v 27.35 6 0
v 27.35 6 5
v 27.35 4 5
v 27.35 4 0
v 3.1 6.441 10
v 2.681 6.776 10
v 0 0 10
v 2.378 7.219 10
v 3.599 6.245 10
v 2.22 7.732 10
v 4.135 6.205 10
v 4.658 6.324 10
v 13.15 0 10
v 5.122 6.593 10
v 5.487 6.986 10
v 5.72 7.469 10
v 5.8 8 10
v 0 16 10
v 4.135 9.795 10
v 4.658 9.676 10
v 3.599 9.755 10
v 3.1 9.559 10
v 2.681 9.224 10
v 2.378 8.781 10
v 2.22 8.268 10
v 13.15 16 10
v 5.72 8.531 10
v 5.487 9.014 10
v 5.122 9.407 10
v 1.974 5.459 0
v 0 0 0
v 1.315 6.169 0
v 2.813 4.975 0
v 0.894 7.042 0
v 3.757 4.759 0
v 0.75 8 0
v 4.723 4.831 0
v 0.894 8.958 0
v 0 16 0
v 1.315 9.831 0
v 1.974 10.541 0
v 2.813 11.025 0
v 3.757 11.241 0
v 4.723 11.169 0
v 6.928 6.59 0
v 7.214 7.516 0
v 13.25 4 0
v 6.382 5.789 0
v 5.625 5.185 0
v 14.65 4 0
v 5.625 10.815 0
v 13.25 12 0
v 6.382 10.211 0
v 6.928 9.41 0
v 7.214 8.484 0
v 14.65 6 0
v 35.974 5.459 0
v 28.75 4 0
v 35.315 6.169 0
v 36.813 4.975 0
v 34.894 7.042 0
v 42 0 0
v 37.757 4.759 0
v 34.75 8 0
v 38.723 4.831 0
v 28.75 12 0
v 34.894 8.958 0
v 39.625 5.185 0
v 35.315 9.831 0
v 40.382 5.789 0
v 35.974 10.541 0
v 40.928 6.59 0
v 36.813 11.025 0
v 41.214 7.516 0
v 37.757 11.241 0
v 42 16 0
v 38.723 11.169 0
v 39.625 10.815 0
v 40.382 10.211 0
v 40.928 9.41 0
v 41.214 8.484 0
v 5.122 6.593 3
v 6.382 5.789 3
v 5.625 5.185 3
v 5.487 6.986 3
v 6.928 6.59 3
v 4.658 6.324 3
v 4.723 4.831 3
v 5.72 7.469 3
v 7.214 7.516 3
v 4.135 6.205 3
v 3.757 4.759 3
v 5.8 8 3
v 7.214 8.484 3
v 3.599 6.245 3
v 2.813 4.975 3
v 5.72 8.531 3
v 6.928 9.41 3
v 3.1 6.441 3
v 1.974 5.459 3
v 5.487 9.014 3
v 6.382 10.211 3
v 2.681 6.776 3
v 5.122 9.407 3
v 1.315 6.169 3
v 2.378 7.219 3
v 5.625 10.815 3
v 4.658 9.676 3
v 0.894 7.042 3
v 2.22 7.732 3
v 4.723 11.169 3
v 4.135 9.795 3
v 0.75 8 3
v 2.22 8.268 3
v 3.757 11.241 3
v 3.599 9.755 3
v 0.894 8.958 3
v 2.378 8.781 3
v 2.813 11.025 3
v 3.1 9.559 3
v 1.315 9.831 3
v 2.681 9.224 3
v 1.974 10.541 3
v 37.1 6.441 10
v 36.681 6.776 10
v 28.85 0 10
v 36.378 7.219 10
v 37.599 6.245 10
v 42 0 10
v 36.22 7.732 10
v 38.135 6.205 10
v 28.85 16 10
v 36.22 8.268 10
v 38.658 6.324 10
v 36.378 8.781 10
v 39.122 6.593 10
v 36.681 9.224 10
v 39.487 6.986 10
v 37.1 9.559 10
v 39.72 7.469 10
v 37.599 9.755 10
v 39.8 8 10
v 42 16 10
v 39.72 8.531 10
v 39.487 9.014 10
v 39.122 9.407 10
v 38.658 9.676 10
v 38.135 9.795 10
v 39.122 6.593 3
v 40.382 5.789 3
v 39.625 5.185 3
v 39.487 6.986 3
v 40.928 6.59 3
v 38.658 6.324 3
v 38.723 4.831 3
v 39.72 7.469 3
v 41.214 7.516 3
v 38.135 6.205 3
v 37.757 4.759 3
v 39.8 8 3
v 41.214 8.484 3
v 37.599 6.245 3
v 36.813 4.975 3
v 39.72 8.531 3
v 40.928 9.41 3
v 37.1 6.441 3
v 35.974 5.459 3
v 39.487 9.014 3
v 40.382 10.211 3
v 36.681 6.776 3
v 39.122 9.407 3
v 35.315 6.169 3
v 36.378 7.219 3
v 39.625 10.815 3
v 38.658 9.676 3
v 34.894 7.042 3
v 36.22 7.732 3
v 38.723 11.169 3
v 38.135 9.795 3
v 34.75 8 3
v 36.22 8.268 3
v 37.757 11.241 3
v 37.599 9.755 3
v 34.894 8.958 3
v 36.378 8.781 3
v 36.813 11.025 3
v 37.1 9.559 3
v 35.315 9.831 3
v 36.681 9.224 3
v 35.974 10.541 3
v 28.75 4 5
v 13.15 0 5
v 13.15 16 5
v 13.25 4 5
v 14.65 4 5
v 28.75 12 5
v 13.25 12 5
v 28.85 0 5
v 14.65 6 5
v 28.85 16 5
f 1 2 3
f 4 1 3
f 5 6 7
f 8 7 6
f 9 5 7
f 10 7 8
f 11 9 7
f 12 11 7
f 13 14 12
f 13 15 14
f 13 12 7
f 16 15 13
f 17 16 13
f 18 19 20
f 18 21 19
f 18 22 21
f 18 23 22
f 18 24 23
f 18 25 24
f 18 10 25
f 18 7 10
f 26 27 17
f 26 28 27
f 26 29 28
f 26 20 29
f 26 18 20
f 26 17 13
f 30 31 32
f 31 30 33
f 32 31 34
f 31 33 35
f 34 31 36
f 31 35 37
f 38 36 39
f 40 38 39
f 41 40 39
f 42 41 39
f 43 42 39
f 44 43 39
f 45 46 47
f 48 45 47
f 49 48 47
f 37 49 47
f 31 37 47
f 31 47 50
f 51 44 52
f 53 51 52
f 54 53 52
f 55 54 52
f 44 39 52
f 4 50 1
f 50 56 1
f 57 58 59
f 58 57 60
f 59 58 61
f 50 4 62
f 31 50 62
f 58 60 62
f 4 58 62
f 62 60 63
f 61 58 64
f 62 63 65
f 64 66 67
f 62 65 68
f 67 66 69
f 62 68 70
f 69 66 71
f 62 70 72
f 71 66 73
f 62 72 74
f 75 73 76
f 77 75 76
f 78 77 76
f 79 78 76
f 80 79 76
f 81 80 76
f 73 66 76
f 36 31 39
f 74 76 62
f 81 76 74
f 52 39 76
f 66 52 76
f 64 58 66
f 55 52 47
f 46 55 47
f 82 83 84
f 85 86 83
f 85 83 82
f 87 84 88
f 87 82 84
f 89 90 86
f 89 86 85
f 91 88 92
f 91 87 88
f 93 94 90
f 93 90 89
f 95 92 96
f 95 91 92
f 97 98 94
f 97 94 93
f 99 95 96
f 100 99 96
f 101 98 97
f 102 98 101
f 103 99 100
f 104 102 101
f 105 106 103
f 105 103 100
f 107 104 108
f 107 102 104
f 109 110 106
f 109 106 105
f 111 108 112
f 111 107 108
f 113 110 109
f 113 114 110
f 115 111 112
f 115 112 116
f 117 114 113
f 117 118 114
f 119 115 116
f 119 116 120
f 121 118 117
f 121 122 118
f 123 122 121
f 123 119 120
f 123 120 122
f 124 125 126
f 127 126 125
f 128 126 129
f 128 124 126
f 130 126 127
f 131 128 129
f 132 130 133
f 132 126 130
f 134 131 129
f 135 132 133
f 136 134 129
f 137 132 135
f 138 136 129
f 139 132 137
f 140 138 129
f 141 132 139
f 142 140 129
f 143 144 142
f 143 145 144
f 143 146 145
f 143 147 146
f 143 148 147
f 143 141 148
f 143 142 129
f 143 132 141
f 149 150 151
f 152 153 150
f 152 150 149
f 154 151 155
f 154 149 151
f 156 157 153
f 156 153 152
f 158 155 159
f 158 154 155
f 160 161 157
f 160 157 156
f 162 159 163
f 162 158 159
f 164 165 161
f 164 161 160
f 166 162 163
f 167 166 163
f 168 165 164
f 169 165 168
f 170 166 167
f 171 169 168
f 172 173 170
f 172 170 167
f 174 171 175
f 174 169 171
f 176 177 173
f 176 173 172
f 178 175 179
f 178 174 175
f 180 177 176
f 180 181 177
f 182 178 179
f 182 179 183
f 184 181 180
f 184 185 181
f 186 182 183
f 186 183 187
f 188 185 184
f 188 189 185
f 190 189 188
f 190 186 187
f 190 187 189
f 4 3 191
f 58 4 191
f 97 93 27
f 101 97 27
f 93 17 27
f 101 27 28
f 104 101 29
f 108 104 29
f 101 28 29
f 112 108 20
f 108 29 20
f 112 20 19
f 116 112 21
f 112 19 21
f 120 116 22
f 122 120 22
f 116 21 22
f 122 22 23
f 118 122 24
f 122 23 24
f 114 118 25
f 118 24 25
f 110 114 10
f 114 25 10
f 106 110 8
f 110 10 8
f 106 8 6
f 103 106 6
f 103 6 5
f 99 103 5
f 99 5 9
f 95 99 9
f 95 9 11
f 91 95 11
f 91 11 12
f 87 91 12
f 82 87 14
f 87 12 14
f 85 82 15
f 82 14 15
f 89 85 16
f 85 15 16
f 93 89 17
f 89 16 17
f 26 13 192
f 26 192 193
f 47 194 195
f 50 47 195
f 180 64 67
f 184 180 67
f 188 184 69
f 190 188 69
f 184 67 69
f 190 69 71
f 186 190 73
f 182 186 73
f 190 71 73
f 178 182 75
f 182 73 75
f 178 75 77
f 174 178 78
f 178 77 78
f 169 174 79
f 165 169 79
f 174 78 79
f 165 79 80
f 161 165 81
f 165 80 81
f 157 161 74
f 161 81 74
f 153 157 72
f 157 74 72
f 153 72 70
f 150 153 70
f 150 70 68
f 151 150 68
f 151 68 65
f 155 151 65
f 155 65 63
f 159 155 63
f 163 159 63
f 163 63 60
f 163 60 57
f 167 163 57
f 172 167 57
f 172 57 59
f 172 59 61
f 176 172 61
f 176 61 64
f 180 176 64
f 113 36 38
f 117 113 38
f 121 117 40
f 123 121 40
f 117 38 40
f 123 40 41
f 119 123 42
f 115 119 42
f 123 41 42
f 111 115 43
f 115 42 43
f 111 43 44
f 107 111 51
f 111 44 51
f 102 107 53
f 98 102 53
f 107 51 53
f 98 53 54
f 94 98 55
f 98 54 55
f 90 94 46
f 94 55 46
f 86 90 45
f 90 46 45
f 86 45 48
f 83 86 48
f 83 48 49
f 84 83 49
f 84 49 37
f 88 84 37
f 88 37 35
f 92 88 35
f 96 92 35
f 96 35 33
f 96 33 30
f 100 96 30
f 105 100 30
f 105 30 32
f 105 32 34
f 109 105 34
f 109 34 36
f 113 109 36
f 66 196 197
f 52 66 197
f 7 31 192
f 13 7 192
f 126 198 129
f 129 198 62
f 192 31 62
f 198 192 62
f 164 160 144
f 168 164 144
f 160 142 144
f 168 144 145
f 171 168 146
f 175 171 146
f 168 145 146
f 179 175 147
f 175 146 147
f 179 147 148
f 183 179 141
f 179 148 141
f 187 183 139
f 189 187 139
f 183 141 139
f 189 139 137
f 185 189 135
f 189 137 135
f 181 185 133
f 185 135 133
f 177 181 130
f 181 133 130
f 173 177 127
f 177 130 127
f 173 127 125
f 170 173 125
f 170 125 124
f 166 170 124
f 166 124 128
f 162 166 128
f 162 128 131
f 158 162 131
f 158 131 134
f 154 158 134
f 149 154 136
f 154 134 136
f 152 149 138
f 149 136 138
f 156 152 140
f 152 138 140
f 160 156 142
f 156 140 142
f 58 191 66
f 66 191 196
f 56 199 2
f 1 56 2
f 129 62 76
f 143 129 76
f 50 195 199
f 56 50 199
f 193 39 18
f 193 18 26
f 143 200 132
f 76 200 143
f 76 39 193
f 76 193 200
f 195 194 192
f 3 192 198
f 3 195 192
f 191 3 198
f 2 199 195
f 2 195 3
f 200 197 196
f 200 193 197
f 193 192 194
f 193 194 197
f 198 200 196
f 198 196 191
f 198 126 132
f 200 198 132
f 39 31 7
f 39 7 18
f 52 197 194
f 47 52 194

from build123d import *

# Parameters (mm, degrees)
SKETCH_1_W                   = 42
SKETCH_1_H                   = 16
EXTRUDE_1_DEPTH              = 10
CUT_EXTRUDE_1_DEPTH          = 47.043457733
SKETCH_4_W                   = 15.7
SKETCH_4_H                   = 16
CUT_EXTRUDE_2_DEPTH          = 5
HOLE_WIZARD_M3_1_D           = 3.6
HOLE_WIZARD_M3_1_CBORE_D     = 6.5
HOLE_WIZARD_M3_1_CBORE_DEPTH = 3


with BuildPart() as part:
    # 草图1 → 凸台-拉伸1 (new body)
    with BuildSketch(Plane.XY):
        with Locations((21, 8)):
            Rectangle(SKETCH_1_W, SKETCH_1_H)
    extrude(amount=EXTRUDE_1_DEPTH)

    # 草图2 → 切除-拉伸1 (cut, through all)
    with BuildSketch(Plane.XY.offset(10)):
        Polygon((28.75, 12), (13.25, 12), (13.25, 4), (14.65, 4), (14.65, 6), (27.35, 6), (27.35, 4), (28.75, 4), align=None)
    extrude(amount=-CUT_EXTRUDE_1_DEPTH, mode=Mode.SUBTRACT)

    # 草图4 → 切除-拉伸2 (cut)
    with BuildSketch(Plane.XY.offset(10)):
        with Locations((21, 8)):
            Rectangle(SKETCH_4_W, SKETCH_4_H)
    extrude(amount=-CUT_EXTRUDE_2_DEPTH, mode=Mode.SUBTRACT)

    # M3 六角凹头螺钉的柱形沉头孔1 (through all)
    with Locations(Plane(origin=(0, 0, 0), x_dir=(-1, 0, 0), z_dir=(0, 0, -1))):
        with Locations((-38, 8), (-4, 8)):
            CounterBoreHole(HOLE_WIZARD_M3_1_D / 2, HOLE_WIZARD_M3_1_CBORE_D / 2, HOLE_WIZARD_M3_1_CBORE_DEPTH)


solid = part.part
